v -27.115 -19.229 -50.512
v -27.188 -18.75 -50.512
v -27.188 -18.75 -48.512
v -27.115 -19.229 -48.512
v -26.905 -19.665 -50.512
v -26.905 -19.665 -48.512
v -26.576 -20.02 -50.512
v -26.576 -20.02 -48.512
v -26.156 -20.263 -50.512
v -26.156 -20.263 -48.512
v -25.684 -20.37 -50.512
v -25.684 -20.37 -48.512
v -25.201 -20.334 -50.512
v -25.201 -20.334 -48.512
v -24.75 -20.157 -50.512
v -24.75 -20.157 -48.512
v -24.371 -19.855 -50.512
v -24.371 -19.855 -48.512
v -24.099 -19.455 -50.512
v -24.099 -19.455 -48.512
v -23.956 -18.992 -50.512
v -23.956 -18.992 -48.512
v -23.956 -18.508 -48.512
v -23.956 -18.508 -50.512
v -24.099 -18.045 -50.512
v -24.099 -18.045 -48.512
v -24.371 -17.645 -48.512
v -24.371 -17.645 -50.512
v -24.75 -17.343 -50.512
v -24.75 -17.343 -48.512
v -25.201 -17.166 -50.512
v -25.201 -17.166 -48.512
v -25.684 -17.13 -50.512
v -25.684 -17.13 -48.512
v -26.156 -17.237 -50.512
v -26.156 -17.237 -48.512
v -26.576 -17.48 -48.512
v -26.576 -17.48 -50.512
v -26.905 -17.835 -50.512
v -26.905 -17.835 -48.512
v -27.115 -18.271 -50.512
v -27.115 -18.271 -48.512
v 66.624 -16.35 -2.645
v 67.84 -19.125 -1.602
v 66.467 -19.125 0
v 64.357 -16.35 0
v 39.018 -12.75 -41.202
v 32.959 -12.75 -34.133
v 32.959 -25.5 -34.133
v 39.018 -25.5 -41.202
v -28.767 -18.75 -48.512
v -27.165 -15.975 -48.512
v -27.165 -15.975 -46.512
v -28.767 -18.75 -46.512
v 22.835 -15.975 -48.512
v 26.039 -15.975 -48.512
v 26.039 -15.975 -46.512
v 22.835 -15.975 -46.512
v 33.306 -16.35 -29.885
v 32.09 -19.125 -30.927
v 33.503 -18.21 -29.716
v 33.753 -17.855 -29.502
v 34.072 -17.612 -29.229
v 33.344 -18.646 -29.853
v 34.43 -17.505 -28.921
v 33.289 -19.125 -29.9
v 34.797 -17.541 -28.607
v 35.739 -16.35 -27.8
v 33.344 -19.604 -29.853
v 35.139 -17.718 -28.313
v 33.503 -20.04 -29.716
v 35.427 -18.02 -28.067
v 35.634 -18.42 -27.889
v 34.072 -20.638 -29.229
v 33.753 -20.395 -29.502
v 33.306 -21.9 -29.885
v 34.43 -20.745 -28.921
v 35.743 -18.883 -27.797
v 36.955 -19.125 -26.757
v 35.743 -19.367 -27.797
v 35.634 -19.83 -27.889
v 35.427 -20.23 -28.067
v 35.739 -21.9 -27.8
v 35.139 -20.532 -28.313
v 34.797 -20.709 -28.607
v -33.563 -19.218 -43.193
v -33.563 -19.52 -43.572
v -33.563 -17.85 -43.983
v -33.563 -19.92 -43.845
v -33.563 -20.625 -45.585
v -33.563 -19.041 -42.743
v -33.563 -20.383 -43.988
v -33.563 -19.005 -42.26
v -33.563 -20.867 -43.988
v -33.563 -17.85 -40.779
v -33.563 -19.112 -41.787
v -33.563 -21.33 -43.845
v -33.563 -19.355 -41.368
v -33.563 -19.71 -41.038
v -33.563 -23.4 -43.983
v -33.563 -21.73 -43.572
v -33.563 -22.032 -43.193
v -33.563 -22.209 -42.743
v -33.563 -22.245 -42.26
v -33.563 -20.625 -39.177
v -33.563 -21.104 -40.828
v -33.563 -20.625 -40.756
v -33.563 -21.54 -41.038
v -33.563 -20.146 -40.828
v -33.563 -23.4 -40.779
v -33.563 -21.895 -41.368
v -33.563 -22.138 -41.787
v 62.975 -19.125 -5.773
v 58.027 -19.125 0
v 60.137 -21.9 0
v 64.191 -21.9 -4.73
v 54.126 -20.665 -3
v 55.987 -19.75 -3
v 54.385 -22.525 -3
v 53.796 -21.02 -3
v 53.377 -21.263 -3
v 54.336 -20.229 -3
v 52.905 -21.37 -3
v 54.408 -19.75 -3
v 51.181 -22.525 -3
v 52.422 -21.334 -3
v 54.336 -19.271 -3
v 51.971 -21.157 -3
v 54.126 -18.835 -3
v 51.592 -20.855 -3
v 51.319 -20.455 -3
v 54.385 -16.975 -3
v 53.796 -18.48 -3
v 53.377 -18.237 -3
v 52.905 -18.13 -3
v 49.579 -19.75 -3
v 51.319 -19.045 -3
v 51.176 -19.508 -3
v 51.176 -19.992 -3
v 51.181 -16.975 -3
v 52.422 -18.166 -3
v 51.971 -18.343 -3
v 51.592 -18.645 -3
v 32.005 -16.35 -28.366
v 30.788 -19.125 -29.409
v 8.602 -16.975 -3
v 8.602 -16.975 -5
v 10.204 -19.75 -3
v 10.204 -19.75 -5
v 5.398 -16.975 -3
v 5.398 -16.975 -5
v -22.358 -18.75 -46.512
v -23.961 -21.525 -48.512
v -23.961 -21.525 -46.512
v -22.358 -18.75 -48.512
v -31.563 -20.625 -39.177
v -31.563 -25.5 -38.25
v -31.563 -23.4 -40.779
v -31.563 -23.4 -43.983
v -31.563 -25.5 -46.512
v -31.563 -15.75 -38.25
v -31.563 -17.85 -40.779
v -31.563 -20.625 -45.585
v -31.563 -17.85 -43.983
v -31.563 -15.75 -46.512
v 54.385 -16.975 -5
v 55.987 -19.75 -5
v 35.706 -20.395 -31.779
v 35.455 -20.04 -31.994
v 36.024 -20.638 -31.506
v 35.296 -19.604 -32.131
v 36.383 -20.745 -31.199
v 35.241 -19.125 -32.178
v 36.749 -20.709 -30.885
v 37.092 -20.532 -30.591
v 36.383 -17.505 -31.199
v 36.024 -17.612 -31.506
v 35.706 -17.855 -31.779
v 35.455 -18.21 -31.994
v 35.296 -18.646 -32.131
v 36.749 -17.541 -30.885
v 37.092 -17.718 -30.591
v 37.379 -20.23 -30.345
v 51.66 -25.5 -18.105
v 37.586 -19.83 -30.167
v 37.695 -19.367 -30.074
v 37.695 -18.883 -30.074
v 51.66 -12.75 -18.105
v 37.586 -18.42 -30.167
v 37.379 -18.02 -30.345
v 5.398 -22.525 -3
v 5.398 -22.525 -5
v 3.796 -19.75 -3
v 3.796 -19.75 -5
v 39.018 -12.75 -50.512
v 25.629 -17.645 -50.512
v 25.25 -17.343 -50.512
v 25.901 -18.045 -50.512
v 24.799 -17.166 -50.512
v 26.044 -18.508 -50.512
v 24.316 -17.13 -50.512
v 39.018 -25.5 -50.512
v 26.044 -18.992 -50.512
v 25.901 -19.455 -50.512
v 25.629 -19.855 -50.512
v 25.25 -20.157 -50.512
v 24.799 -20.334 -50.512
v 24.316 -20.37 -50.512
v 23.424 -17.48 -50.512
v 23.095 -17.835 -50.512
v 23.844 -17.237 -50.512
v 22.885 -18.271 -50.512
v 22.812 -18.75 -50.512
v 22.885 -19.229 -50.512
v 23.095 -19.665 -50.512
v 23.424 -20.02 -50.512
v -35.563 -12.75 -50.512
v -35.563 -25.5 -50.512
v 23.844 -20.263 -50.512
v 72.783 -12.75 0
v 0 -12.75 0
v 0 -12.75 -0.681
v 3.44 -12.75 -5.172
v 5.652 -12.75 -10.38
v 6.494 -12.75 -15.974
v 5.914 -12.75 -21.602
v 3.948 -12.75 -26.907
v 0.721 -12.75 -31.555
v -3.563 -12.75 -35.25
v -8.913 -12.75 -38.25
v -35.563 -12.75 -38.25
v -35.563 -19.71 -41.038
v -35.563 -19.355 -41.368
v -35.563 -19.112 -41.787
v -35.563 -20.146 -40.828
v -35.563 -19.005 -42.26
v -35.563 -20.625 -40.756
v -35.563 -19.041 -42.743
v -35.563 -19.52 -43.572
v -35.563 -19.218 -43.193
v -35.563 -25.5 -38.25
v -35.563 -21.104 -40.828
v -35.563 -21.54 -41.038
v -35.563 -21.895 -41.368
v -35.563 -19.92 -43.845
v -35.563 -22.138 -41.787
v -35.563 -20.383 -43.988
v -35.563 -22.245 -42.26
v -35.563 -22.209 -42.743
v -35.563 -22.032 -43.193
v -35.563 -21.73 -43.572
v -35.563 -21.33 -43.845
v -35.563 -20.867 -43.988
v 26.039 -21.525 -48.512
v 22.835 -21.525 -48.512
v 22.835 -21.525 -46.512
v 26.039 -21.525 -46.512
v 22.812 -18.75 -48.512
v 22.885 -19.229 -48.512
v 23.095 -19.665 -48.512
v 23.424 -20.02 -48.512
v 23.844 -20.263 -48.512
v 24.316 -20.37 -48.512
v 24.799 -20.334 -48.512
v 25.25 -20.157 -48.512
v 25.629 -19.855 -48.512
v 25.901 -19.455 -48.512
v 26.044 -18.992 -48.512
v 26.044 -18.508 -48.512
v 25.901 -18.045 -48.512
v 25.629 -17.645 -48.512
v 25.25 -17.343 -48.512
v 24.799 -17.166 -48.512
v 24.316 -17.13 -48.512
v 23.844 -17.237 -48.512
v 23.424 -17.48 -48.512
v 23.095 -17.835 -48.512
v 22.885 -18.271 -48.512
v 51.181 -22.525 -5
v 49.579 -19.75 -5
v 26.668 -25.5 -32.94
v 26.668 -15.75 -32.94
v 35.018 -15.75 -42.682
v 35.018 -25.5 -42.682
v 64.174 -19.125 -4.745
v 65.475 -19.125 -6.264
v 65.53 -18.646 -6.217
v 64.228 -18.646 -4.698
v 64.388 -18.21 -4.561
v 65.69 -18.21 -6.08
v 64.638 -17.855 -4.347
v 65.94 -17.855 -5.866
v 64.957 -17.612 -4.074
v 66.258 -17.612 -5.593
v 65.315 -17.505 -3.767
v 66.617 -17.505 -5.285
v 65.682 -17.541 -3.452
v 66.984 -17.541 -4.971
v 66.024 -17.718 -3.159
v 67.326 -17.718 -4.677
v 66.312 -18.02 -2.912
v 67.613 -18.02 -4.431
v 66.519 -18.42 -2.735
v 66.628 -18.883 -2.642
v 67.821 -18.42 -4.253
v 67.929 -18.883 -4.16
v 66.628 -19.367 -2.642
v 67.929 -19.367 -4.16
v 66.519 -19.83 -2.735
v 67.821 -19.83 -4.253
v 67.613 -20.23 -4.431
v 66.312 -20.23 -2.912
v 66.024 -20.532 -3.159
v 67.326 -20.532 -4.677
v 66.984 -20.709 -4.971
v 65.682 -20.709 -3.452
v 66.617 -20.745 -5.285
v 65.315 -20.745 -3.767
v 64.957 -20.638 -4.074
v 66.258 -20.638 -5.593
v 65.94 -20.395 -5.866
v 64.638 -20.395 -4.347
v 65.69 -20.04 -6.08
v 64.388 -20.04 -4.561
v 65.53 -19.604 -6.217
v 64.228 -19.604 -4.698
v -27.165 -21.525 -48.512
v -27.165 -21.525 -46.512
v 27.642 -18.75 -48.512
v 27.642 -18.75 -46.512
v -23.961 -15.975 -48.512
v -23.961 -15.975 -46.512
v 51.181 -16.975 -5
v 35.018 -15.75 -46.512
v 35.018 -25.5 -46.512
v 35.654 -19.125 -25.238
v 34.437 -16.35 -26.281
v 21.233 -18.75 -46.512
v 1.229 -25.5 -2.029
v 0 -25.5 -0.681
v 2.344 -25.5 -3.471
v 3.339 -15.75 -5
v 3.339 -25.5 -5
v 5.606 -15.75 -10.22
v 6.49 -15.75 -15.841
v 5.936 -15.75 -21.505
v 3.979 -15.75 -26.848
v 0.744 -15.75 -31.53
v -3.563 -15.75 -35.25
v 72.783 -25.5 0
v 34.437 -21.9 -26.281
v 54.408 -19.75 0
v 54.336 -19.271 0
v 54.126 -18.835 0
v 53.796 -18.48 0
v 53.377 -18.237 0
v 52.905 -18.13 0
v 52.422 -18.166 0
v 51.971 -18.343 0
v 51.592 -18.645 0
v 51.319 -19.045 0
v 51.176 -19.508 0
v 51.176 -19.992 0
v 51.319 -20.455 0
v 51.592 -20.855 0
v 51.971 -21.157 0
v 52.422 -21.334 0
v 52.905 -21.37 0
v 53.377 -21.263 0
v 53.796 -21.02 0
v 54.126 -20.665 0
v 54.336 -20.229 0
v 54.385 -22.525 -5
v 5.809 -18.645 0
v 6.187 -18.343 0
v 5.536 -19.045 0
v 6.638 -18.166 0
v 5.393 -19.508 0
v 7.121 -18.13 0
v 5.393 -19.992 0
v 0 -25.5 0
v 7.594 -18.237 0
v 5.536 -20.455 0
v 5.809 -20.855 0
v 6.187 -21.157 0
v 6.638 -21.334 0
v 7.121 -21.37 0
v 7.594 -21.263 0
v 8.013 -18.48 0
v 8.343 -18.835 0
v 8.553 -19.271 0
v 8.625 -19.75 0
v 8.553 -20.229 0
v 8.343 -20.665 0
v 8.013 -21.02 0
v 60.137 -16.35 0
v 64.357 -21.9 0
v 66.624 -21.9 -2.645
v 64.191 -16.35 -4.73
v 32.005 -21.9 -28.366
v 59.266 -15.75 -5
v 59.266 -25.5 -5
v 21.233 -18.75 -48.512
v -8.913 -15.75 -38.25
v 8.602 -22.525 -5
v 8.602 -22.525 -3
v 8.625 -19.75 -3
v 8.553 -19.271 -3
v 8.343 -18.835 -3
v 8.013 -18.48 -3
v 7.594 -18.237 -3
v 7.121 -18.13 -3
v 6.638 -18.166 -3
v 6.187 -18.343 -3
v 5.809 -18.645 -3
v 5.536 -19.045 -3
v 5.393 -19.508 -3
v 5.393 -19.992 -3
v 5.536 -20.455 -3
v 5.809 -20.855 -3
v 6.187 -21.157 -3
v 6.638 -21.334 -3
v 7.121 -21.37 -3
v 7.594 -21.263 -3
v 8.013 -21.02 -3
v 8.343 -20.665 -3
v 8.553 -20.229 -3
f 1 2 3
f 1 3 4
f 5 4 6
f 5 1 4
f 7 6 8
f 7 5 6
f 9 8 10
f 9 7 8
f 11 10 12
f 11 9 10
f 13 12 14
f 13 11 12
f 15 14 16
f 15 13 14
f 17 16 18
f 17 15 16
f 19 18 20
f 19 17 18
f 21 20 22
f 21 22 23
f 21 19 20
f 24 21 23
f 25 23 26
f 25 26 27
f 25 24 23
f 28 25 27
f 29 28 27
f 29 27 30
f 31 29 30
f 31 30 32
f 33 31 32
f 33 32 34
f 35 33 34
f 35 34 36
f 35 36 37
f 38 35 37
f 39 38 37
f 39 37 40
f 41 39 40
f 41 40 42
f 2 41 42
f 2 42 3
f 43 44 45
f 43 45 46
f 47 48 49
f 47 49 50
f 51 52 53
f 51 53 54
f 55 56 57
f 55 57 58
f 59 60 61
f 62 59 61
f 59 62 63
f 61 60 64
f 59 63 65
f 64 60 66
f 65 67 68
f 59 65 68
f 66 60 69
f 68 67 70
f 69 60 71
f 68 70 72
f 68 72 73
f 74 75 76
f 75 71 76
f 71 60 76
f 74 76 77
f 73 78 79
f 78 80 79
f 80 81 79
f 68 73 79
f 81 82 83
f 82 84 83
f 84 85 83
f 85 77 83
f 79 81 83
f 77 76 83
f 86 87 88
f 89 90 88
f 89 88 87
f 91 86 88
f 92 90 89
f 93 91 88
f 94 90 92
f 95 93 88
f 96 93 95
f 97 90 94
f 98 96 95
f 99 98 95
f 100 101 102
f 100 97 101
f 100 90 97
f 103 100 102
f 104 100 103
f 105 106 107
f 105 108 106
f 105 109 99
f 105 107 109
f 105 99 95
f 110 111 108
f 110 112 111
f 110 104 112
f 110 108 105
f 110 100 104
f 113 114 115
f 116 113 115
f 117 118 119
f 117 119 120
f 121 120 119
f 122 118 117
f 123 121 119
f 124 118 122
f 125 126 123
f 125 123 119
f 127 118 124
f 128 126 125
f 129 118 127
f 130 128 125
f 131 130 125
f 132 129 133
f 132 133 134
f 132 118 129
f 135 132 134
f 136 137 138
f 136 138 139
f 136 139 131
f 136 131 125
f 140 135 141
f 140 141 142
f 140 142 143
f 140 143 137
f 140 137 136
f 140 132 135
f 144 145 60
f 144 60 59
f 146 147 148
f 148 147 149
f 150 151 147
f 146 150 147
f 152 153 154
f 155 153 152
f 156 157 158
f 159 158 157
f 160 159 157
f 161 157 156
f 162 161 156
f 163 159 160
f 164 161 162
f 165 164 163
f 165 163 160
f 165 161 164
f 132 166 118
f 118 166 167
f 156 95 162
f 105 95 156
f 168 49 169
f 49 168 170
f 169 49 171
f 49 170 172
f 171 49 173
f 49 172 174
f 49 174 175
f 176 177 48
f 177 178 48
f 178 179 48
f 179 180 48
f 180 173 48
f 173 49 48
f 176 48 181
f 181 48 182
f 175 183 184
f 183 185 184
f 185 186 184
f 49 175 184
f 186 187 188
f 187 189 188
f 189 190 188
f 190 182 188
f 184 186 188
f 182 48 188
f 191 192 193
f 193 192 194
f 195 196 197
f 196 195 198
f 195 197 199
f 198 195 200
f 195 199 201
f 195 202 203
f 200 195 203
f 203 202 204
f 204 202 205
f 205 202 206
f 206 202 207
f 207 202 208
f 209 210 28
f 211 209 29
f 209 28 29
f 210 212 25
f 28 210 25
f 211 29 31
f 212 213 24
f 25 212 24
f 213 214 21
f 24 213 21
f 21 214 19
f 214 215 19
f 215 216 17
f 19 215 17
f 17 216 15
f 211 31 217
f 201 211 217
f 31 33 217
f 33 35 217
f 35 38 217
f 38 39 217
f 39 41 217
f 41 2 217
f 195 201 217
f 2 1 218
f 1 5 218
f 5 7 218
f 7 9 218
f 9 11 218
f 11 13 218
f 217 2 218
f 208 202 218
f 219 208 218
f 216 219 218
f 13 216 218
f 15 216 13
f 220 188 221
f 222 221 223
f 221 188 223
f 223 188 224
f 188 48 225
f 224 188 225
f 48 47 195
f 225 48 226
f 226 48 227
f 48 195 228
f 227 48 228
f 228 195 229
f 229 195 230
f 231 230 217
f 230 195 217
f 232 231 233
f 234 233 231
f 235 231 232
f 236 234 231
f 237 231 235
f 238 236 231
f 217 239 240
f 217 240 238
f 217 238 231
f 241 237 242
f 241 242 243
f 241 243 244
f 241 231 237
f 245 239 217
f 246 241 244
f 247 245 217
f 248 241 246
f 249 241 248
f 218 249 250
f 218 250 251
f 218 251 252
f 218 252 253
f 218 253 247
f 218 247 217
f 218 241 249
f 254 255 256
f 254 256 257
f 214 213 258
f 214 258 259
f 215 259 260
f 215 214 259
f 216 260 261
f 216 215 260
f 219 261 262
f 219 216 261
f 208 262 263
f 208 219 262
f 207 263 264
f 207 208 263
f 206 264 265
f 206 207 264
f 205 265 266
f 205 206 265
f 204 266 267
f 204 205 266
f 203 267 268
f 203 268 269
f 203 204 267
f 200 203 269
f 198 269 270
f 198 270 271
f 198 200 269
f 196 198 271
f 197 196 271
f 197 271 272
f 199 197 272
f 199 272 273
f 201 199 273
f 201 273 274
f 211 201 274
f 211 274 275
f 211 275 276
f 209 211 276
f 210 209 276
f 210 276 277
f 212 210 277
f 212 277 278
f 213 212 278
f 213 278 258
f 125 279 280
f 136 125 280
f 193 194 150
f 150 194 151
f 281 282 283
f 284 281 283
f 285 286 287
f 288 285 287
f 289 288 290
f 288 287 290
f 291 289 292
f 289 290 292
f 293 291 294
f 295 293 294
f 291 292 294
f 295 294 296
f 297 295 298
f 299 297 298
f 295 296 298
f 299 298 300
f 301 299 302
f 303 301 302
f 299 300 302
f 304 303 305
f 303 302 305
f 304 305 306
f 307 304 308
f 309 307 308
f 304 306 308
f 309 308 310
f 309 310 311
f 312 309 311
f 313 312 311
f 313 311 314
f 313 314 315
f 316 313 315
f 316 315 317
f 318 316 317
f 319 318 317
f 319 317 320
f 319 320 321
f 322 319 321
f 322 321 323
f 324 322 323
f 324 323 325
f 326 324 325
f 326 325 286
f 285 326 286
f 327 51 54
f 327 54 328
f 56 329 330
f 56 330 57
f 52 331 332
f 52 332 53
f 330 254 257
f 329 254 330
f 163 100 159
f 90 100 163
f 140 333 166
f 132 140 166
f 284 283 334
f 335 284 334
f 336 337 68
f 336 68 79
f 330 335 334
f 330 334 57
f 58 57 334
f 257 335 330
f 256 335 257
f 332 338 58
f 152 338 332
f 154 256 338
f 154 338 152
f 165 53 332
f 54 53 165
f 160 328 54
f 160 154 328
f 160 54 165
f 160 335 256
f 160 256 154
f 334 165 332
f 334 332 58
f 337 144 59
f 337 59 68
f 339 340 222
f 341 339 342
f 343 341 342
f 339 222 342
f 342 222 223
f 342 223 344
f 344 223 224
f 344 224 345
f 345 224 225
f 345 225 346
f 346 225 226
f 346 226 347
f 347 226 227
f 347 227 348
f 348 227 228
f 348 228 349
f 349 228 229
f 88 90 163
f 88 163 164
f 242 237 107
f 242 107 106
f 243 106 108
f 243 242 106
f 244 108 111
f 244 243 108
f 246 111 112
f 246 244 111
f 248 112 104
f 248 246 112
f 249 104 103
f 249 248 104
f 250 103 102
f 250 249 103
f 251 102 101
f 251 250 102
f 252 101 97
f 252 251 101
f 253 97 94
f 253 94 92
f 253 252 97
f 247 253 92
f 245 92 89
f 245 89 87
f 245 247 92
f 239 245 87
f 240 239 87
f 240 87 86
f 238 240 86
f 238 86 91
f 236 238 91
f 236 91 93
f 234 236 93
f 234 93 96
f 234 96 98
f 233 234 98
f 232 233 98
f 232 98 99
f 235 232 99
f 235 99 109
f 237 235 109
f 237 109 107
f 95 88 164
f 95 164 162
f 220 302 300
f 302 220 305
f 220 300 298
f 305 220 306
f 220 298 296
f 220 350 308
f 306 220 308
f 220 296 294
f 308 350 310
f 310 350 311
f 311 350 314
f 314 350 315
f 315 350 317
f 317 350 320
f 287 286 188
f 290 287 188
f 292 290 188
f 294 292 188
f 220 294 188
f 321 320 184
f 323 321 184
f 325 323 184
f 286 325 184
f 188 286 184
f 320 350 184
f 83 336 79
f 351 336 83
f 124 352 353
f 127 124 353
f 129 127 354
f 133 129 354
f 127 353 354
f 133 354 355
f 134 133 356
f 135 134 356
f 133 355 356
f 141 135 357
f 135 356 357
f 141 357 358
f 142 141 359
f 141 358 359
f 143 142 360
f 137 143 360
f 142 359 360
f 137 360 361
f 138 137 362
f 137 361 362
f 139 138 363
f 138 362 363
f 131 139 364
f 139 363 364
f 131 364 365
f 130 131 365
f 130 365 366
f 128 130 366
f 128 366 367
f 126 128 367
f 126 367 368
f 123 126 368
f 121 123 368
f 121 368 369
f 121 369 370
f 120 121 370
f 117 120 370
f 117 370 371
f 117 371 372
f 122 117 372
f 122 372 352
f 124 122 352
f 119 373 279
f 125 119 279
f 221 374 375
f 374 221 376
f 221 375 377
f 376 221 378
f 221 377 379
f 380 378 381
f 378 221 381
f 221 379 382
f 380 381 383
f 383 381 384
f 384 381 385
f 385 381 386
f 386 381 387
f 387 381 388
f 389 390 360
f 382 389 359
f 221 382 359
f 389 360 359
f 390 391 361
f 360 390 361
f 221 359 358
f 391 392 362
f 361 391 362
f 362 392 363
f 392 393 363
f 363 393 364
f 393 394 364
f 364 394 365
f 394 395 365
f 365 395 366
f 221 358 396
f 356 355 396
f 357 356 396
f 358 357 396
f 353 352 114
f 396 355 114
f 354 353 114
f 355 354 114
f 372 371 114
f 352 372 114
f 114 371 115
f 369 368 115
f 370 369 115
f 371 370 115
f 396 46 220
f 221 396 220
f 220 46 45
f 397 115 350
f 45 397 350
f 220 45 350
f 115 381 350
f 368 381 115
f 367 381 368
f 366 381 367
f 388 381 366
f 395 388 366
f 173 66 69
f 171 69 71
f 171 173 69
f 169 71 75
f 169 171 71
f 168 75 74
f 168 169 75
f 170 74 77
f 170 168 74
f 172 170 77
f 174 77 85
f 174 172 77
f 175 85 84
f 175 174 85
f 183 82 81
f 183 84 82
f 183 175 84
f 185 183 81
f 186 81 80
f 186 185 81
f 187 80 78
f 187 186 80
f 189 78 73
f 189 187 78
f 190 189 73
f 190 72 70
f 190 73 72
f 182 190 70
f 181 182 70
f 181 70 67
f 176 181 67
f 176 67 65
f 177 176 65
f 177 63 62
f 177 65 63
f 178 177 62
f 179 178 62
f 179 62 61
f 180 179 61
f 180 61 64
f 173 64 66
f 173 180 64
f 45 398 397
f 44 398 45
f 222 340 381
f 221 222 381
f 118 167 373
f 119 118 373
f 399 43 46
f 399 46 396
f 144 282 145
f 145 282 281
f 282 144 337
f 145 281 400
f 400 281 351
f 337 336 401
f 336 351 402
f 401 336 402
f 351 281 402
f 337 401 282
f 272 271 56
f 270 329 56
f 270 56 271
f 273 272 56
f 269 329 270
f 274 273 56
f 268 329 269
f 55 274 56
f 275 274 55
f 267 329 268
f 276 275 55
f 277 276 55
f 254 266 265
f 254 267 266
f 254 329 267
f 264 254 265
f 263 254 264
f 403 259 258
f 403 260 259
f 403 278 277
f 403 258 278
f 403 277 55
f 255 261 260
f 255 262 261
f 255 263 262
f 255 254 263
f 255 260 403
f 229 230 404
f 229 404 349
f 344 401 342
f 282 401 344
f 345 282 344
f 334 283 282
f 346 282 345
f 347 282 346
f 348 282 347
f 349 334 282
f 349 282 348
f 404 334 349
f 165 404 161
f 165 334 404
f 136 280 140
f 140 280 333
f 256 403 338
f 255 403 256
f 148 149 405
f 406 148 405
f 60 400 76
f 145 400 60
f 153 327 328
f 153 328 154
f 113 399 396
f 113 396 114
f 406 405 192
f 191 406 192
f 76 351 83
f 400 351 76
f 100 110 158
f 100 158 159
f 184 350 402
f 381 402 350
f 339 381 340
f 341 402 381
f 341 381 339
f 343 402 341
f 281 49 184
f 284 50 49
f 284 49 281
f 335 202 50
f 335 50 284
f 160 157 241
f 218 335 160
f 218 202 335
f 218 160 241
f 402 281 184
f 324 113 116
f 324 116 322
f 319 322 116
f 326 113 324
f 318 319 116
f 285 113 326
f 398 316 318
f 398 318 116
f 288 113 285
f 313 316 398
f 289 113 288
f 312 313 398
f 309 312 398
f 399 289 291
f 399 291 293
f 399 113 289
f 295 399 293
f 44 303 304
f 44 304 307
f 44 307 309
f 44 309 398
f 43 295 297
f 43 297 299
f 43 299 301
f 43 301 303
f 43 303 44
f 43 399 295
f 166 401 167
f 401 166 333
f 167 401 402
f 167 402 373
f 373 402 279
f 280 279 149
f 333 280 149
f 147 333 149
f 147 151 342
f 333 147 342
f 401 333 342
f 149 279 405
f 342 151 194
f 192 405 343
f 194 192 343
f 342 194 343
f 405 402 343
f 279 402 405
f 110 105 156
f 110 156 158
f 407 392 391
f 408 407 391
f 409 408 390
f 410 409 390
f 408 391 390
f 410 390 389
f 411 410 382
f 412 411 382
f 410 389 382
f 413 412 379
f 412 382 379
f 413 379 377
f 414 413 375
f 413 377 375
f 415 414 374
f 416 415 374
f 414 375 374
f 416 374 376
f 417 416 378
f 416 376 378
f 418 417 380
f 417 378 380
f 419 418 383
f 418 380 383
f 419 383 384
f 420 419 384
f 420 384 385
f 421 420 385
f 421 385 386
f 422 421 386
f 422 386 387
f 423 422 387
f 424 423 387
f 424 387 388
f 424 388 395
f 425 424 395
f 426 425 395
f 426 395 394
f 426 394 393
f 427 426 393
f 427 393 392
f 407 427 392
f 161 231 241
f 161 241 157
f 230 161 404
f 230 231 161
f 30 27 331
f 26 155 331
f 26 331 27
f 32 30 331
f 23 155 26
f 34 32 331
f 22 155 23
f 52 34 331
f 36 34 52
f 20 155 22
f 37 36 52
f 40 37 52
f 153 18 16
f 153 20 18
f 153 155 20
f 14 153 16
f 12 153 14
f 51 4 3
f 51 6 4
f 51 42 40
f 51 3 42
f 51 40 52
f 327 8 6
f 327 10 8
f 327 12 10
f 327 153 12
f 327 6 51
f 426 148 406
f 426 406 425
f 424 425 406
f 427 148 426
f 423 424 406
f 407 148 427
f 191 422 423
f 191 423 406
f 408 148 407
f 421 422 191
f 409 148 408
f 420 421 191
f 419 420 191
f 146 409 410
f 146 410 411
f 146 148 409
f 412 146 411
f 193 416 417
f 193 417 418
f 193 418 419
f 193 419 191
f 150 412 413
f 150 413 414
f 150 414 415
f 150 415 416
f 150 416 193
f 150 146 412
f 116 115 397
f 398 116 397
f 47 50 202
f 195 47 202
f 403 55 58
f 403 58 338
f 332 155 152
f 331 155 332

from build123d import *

# Parameters (mm, degrees)
SALIENTE_EXTRUIR1_DEPTH     = 12.75
CORTAR_EXTRUIR1_REACH       = 31.62
CROQUIS2_R                  = 1.625
CROQUIS3_R                  = 22.5
CORTAR_EXTRUIR2_DEPTH       = 13.75
SALIENTE_EXTRUIR2_DEPTH     = 3
SALIENTE_EXTRUIR3_DEPTH     = 9.75
CROQUIS6_R                  = 1.625
CORTAR_EXTRUIR3_DEPTH       = 10
CORTAR_EXTRUIR4_START       = -2
CORTAR_EXTRUIR4_DEPTH       = 10
CORTAR_EXTRUIR5_START       = -2
CORTAR_EXTRUIR5_DEPTH       = 10
CORTAR_EXTRUIR6_DEPTH       = 2
CORTAR_EXTRUIR7_REACH       = 37.25
CROQUIS10_R                 = 1.625
CORTAR_EXTRUIR8_DEPTH       = 2
CROQUIS12_W                 = 92.508691999
CROQUIS12_H                 = 24.255818813
CORTAR_EXTRUIR9_DEPTH       = 1
CORTAR_EXTRUIR9_DEPTH_BACK  = 36.25
SALIENTE_EXTRUIR4_DEPTH     = 12.75
CORTAR_EXTRUIR10_START      = -9.75
CORTAR_EXTRUIR10_DEPTH      = 9.75
CROQUIS16_W                 = 68.039065087
CROQUIS16_H                 = 12.75
CORTAR_EXTRUIR11_DEPTH      = 1
CROQUIS17_W                 = 40.657498706
CROQUIS17_H                 = 22.934549925
CORTAR_EXTRUIR12_DEPTH      = 1
CORTAR_EXTRUIR12_DEPTH_BACK = 13.75
SALIENTE_EXTRUIR5_REACH     = 14.75
CROQUIS18_W                 = 34.9120451
CROQUIS18_H                 = 3.951156815
CROQUIS20_R                 = 1.625
CORTAR_EXTRUIR14_DEPTH      = 10
CORTAR_EXTRUIR15_DEPTH      = 2
CROQUIS22_R                 = 1.625
CORTAR_EXTRUIR16_DEPTH      = 10
CORTAR_EXTRUIR17_DEPTH      = 2
SALIENTE_EXTRUIR6_DEPTH     = 12.75
CORTAR_EXTRUIR18_DEPTH      = 2
CROQUIS28_R                 = 1.625
SALIENTE_EXTRUIR7_DEPTH     = 1
CORTAR_EXTRUIR19_REACH      = 110.346
CROQUIS29_R                 = 1.625
CORTAR_EXTRUIR20_DEPTH      = 2
SALIENTE_EXTRUIR11_DEPTH    = 12.75
CROQUIS41_R                 = 1.625
CORTAR_EXTRUIR25_DEPTH      = 10
SALIENTE_EXTRUIR12_DEPTH    = 12.75
SALIENTE_EXTRUIR13_DEPTH    = 12.75
CORTAR_EXTRUIR26_DEPTH      = 13.75
SALIENTE_EXTRUIR14_START    = -9.15
SALIENTE_EXTRUIR14_DEPTH    = 5.55
SALIENTE_EXTRUIR15_REACH    = 14.75
CORTAR_EXTRUIR27_REACH      = 110.346
CROQUIS47_R                 = 1.625
CORTAR_EXTRUIR28_REACH      = 112.346
CORTAR_EXTRUIR28_START      = -2
CORTAR_EXTRUIR29_START      = -9.75
CORTAR_EXTRUIR29_DEPTH      = 9.75
CORTAR_EXTRUIR30_REACH      = 52.512
CROQUIS50_R                 = 1.625
CORTAR_EXTRUIR31_REACH      = 54.512
CORTAR_EXTRUIR31_START      = -2
CROQUIS19_W                 = 120.448667976
CROQUIS19_H                 = 32.886651308
CORTAR_EXTRUIR13_DEPTH      = 1
CORTAR_EXTRUIR13_DEPTH_BACK = 62.623336743


with BuildPart() as part:
    # Croquis1 → Saliente-Extruir1 (new body)
    with BuildSketch(Plane(origin=(0, 0, 0), x_dir=(1, 0, 0), z_dir=(0, 1, 0))):
        Polygon((0, 0), (72.78319995, 0), (38.224450787, 29.62043043), (35.621353918, 26.5833452), (60.803074847, 5), (0, 5), align=None)
    extrude(amount=SALIENTE_EXTRUIR1_DEPTH)

    # Croquis2 → Cortar-Extruir1 (cut, up to next)
    with BuildSketch(Plane.XY, mode=Mode.PRIVATE) as cortar_extruir1_sk1:
        with Locations((52.78319995, 5.75)):
            Circle(CROQUIS2_R)
    cortar_extruir1_tool1 = extrude(cortar_extruir1_sk1.sketch, amount=-CORTAR_EXTRUIR1_REACH, mode=Mode.PRIVATE) & part.part
    add(cortar_extruir1_tool1.solids().sort_by_distance((52.7832, 5.75, 0))[0], mode=Mode.SUBTRACT)
    # Croquis2 → Cortar-Extruir1 (cut, up to next)
    with BuildSketch(Plane.XY, mode=Mode.PRIVATE) as cortar_extruir1_sk2:
        with Locations((6.99999995, 5.75)):
            Circle(CROQUIS2_R)
    cortar_extruir1_tool2 = extrude(cortar_extruir1_sk2.sketch, amount=-CORTAR_EXTRUIR1_REACH, mode=Mode.PRIVATE) & part.part
    add(cortar_extruir1_tool2.solids().sort_by_distance((7, 5.75, 0))[0], mode=Mode.SUBTRACT)

    # Croquis3 → Cortar-Extruir2 (cut, through all)
    with BuildSketch(Plane(origin=(0, 12.75, 0), x_dir=(1, 0, 0), z_dir=(0, 1, 0))):
        with Locations((-16, 16.5)):
            Circle(CROQUIS3_R)
    extrude(amount=-CORTAR_EXTRUIR2_DEPTH, mode=Mode.SUBTRACT)

    # Croquis4 → Saliente-Extruir2 (add)
    with BuildSketch(Plane(origin=(0, 12.75, 0), x_dir=(1, 0, 0), z_dir=(0, 1, 0))):
        with BuildLine():
            Line((38.224450787, 29.62043043), (31.656319269, 35.25))
            Line((31.656319269, 35.25), (-3.562657036, 35.25))
            ThreePointArc((-3.562657036, 35.25), (5.936291456, 21.504909307), (3.339079606, 5))
            Line((3.339079606, 5), (60.803074847, 5))
            Line((60.803074847, 5), (35.621353918, 26.5833452))
            Line((35.621353918, 26.5833452), (38.224450787, 29.62043043))
        make_face()
    extrude(amount=-SALIENTE_EXTRUIR2_DEPTH)

    # Croquis5 → Saliente-Extruir3 (add)
    with BuildSketch(Plane.XZ.offset(-9.75)):
        with BuildLine():
            Line((-3.562657036, -35.25), (31.656319269, -35.25))
            Line((31.656319269, -35.25), (38.224450787, -29.62043043))
            Line((38.224450787, -29.62043043), (35.621353918, -26.5833452))
            Line((35.621353918, -26.5833452), (30.17667434, -31.25))
            Line((30.17667434, -31.25), (0.990806338, -31.25))
            ThreePointArc((0.990806338, -31.25), (-1.15062315, -33.404023402), (-3.562657036, -35.25))
        make_face()
    extrude(amount=SALIENTE_EXTRUIR3_DEPTH)

    # Croquis6 → Cortar-Extruir3 (cut)
    with BuildSketch(Plane(origin=(30.824200619, 0, -35.963211942), x_dir=(-0.759271307, 0, -0.650774217), z_dir=(0.650774217, 0, -0.759271307))):
        with Locations((-47.262195378, 6.375)):
            Circle(CROQUIS6_R)
        with Locations((-7.442195378, 6.375)):
            Circle(CROQUIS6_R)
    extrude(amount=-CORTAR_EXTRUIR3_DEPTH, mode=Mode.SUBTRACT)

    # Croquis7 → Cortar-Extruir4 (cut)
    with BuildSketch(Plane(origin=(28.22110375, 0, -32.926126712), x_dir=(0.759271307, 0, 0.650774217), z_dir=(-0.650774217, 0, 0.759271307)).offset(CORTAR_EXTRUIR4_START)):
        Polygon((48.864342375, 3.6), (50.466489372, 6.375), (48.864342375, 9.15), (45.660048381, 9.15), (44.057901384, 6.375), (45.660048381, 3.6), align=None)
    extrude(amount=CORTAR_EXTRUIR4_DEPTH, mode=Mode.SUBTRACT)

    # Croquis8 → Cortar-Extruir5 (cut)
    with BuildSketch(Plane(origin=(28.22110375, 0, -32.926126712), x_dir=(0.759271307, 0, 0.650774217), z_dir=(-0.650774217, 0, 0.759271307)).offset(CORTAR_EXTRUIR5_START)):
        Polygon((9.044342375, 3.6), (10.646489372, 6.375), (9.044342375, 9.15), (5.840048381, 9.15), (4.237901384, 6.375), (5.840048381, 3.6), align=None)
    extrude(amount=CORTAR_EXTRUIR5_DEPTH, mode=Mode.SUBTRACT)

    # Croquis9 → Cortar-Extruir6 (cut)
    with BuildSketch(Plane(origin=(0, 0, -5), x_dir=(-1, 0, 0), z_dir=(0, 0, -1))):
        Polygon((-5.397852953, 2.975), (-3.795705956, 5.75), (-5.397852953, 8.525), (-8.602146947, 8.525), (-10.204293944, 5.75), (-8.602146947, 2.975), align=None)
        Polygon((-51.181052953, 2.975), (-49.578905956, 5.75), (-51.181052953, 8.525), (-54.385346947, 8.525), (-55.987493944, 5.75), (-54.385346947, 2.975), align=None)
    extrude(amount=-CORTAR_EXTRUIR6_DEPTH, mode=Mode.SUBTRACT)

    # Croquis10 → Cortar-Extruir7 (cut, up to next)
    with BuildSketch(Plane(origin=(0, 0, -35.25), x_dir=(-1, 0, 0), z_dir=(0, 0, -1)), mode=Mode.PRIVATE) as cortar_extruir7_sk1:
        with Locations((-21.656319269, 6.375)):
            Circle(CROQUIS10_R)
    cortar_extruir7_tool1 = extrude(cortar_extruir7_sk1.sketch, amount=-CORTAR_EXTRUIR7_REACH, mode=Mode.PRIVATE) & part.part
    add(cortar_extruir7_tool1.solids().sort_by_distance((21.656319, 6.375, -35.25))[0], mode=Mode.SUBTRACT)

    # Croquis11 → Cortar-Extruir8 (cut)
    with BuildSketch(Plane.XY.offset(-31.25)):
        Polygon((23.258466266, 3.6), (24.860613263, 6.375), (23.258466266, 9.15), (20.054172272, 9.15), (18.452025275, 6.375), (20.054172272, 3.6), align=None)
    extrude(amount=-CORTAR_EXTRUIR8_DEPTH, mode=Mode.SUBTRACT)

    # Simetría1: part across plane


with BuildPart() as part_1:
    add(part.part)
    add(part.part.mirror(Plane.ZX))

    # Croquis12 → Cortar-Extruir9 (cut, two sides)
    with BuildSketch(Plane(origin=(0, 0, -35.25), x_dir=(-1, 0, 0), z_dir=(0, 0, -1))) as cortar_extruir9_sk:
        with Locations((-33.077560565, 12.127909407)):
            Rectangle(CROQUIS12_W, CROQUIS12_H)
    extrude(amount=CORTAR_EXTRUIR9_DEPTH, mode=Mode.SUBTRACT)
    extrude(cortar_extruir9_sk.sketch, amount=-CORTAR_EXTRUIR9_DEPTH_BACK, mode=Mode.SUBTRACT)

    # Croquis13 → Saliente-Extruir4 (add)
    with BuildSketch(Plane.XZ.offset(12.75)):
        Polygon((-35.562657036, -82.38260805), (-35.562657036, -38.25), (-8.913300435, -38.25), (-3.562657036, -35.25), (31.656319269, -35.25), (0.000162281, -62.38260805), align=None)
    extrude(amount=-SALIENTE_EXTRUIR4_DEPTH)

    # Croquis14 → Cortar-Extruir10 (cut)
    with BuildSketch(Plane(origin=(0, 0, 0), x_dir=(1, 0, 0), z_dir=(0, 1, 0)).offset(CORTAR_EXTRUIR10_START)):
        Polygon((30.17667434, 31.25), (0.990806338, 31.25), (-31.562657036, 38.25), (-31.562657036, 75.543902968), (-2.303881466, 59.089203295), align=None)
    extrude(amount=CORTAR_EXTRUIR10_DEPTH, mode=Mode.SUBTRACT)

    # Croquis16 → Cortar-Extruir11 (cut)
    with BuildSketch(Plane(origin=(30.824200619, 0, -35.963211942), x_dir=(-0.759271307, 0, -0.650774217), z_dir=(0.650774217, 0, -0.759271307))):
        with Locations((6.577337166, -6.375)):
            Rectangle(CROQUIS16_W, CROQUIS16_H)
    extrude(amount=-CORTAR_EXTRUIR11_DEPTH, mode=Mode.SUBTRACT)

    # Croquis17 → Cortar-Extruir12 (cut, two sides)
    with BuildSketch(Plane.XZ.offset(12.75)) as cortar_extruir12_sk:
        with Locations((-20.328587072, -73.090611706)):
            Rectangle(CROQUIS17_W, CROQUIS17_H)
    extrude(amount=CORTAR_EXTRUIR12_DEPTH, mode=Mode.SUBTRACT)
    extrude(cortar_extruir12_sk.sketch, amount=-CORTAR_EXTRUIR12_DEPTH_BACK, mode=Mode.SUBTRACT)

    # Croquis18 → Saliente-Extruir5 (add, up to next)
    with BuildSketch(Plane(origin=(0, 0, 0), x_dir=(1, 0, 0), z_dir=(0, 1, 0)), mode=Mode.PRIVATE) as saliente_extruir5_sk1:
        with Locations((-18.106634486, 59.647758336)):
            Rectangle(CROQUIS18_W, CROQUIS18_H)
    saliente_extruir5_tool1 = extrude(saliente_extruir5_sk1.sketch, amount=-SALIENTE_EXTRUIR5_REACH, mode=Mode.PRIVATE) - part_1.part
    add(saliente_extruir5_tool1.solids().sort_by_distance((-18.106634, 0, -59.647758))[0])

    # Croquis20 → Cortar-Extruir14 (cut)
    with BuildSketch(Plane(origin=(30.173426402, 0, -35.203940634), x_dir=(-0.759271307, 0, -0.650774217), z_dir=(0.650774217, 0, -0.759271307))):
        with Locations((25.596869709, -6.375)):
            Circle(CROQUIS20_R)
        with Locations((-7.442195378, -6.375)):
            Circle(CROQUIS20_R)
    extrude(amount=-CORTAR_EXTRUIR14_DEPTH, mode=Mode.SUBTRACT)

    # Croquis21 → Cortar-Extruir15 (cut)
    with BuildSketch(Plane(origin=(28.22110375, 0, -32.926126712), x_dir=(0.759271307, 0, 0.650774217), z_dir=(-0.650774217, 0, 0.759271307))):
        Polygon((-23.994722712, -9.15), (-22.392575715, -6.375), (-23.994722712, -3.6), (-27.199016706, -3.6), (-28.801163703, -6.375), (-27.199016706, -9.15), align=None)
    extrude(amount=-CORTAR_EXTRUIR15_DEPTH, mode=Mode.SUBTRACT)

    # Croquis22 → Cortar-Extruir16 (cut)
    with BuildSketch(Plane(origin=(0, 0, -61.623336743), x_dir=(-1, 0, 0), z_dir=(0, 0, -1))):
        with Locations((18.112657036, -6.375)):
            Circle(CROQUIS22_R)
    extrude(amount=-CORTAR_EXTRUIR16_DEPTH, mode=Mode.SUBTRACT)

    # Croquis23 → Cortar-Extruir17 (cut)
    with BuildSketch(Plane.XY.offset(-57.672179928)):
        Polygon((-16.510510039, -9.15), (-14.908363042, -6.375), (-16.510510039, -3.6), (-19.714804033, -3.6), (-21.31695103, -6.375), (-19.714804033, -9.15), align=None)
    extrude(amount=-CORTAR_EXTRUIR17_DEPTH, mode=Mode.SUBTRACT)

    # Croquis26 → Saliente-Extruir6 (add)
    with BuildSketch(Plane(origin=(0, 0, 0), x_dir=(1, 0, 0), z_dir=(0, 1, 0))):
        Polygon((60.803074847, 5), (-2.287792345, 59.07541325), (-2.938566562, 58.316141943), (60.15230063, 4.240728693), align=None)
    extrude(amount=-SALIENTE_EXTRUIR6_DEPTH)

    # Croquis27 → Cortar-Extruir18 (cut)
    with BuildSketch(Plane(origin=(27.570329533, 0, -32.166855405), x_dir=(0.759271307, 0, 0.650774217), z_dir=(-0.650774217, 0, 0.759271307))):
        Polygon((-22.421443229, -6.375), (-24.009156469, -3.625), (-27.184582949, -3.625), (-28.77229619, -6.375), (-27.184582949, -9.125), (-24.009156469, -9.125), align=None)
        Polygon((10.646489372, -6.375), (9.044342375, -3.6), (5.840048381, -3.6), (4.237901384, -6.375), (5.840048381, -9.15), (9.044342375, -9.15), align=None)
    extrude(amount=-CORTAR_EXTRUIR18_DEPTH, mode=Mode.SUBTRACT)

    # Croquis28 → Saliente-Extruir7 (add)
    with BuildSketch(Plane(origin=(29.522652185, 0, -34.444669327), x_dir=(0.759271307, 0, 0.650774217), z_dir=(-0.650774217, 0, 0.759271307))):
        Polygon((-24.009156469, -3.625), (-27.184582949, -3.625), (-28.77229619, -6.375), (-27.184582949, -9.125), (-24.009156469, -9.125), (-22.421443229, -6.375), align=None)
        with Locations((-25.596869709, -6.375)):
            Circle(CROQUIS28_R, mode=Mode.SUBTRACT)
        Polygon((10.646489372, -6.375), (9.044342375, -3.6), (5.840048381, -3.6), (4.237901384, -6.375), (5.840048381, -9.15), (9.044342375, -9.15), align=None)
        with Locations((7.442195378, -6.375)):
            Circle(CROQUIS28_R, mode=Mode.SUBTRACT)
    extrude(amount=SALIENTE_EXTRUIR7_DEPTH)

    # Croquis29 → Cortar-Extruir19 (cut, up to next)
    with BuildSketch(Plane.ZY.offset(35.562657036), mode=Mode.PRIVATE) as cortar_extruir19_sk1:
        with Locations((-51.623336743, -6.375)):
            Circle(CROQUIS29_R)
    cortar_extruir19_tool1 = extrude(cortar_extruir19_sk1.sketch, amount=-CORTAR_EXTRUIR19_REACH, mode=Mode.PRIVATE) & part_1.part
    add(cortar_extruir19_tool1.solids().sort_by_distance((-35.562657, -6.375, -51.623337))[0], mode=Mode.SUBTRACT)

    # Croquis30 → Cortar-Extruir20 (cut)
    with BuildSketch(Plane(origin=(-31.562657036, 0, 0), x_dir=(0, 0, -1), z_dir=(1, 0, 0))):
        Polygon((53.22548374, -9.15), (54.827630737, -6.375), (53.22548374, -3.6), (50.021189746, -3.6), (48.419042749, -6.375), (50.021189746, -9.15), align=None)
    extrude(amount=-CORTAR_EXTRUIR20_DEPTH, mode=Mode.SUBTRACT)

    # Croquis40 → Saliente-Extruir11 (add)
    with BuildSketch(Plane.XZ.offset(12.75)):
        Polygon((51.009497963, -17.345267417), (-0.650611936, -61.623336743), (0.886019316, -61.623336743), (51.66027218, -18.104538724), align=None)
    extrude(amount=-SALIENTE_EXTRUIR11_DEPTH)

    # Croquis41 → Cortar-Extruir25 (cut)
    with BuildSketch(Plane(origin=(30.824200619, 0, -35.963211942), x_dir=(-0.759271307, 0, -0.650774217), z_dir=(0.650774217, 0, -0.759271307))):
        with Locations((-7.442195378, -6.375)):
            Circle(CROQUIS41_R)
        with Locations((25.596869709, -6.375)):
            Circle(CROQUIS41_R)
    extrude(amount=-CORTAR_EXTRUIR25_DEPTH, mode=Mode.SUBTRACT)

    # Croquis42 → Saliente-Extruir12 (add)
    with BuildSketch(Plane.XZ.offset(12.75)):
        Polygon((32.95941988, -34.133107696), (39.018127843, -41.201923567), (24.71209089, -41.201923567), align=None)
    extrude(amount=-SALIENTE_EXTRUIR12_DEPTH)

    # Croquis43 → Saliente-Extruir13 (add)
    with BuildSketch(Plane.XZ.offset(12.75)):
        Polygon((39.018127843, -41.201923567), (39.018127843, -50.511923567), (13.849927511, -50.511923567), (24.71209089, -41.201923567), align=None)
    extrude(amount=-SALIENTE_EXTRUIR13_DEPTH)

    # Croquis44 → Cortar-Extruir26 (cut, through all)
    with BuildSketch(Plane.XZ.offset(12.75)):
        Polygon((13.849927511, -50.511923567), (-35.562657036, -50.511923567), (-35.562657036, -61.623336743), (0.886019316, -61.623336743), align=None)
    extrude(amount=-CORTAR_EXTRUIR26_DEPTH, mode=Mode.SUBTRACT)

    # Croquis45 → Saliente-Extruir14 (add)
    with BuildSketch(Plane(origin=(0, 0, 0), x_dir=(1, 0, 0), z_dir=(0, 1, 0)).offset(SALIENTE_EXTRUIR14_START)):
        Polygon((6.166771253, 50.511923567), (21.724093533, 50.511923567), (21.724093533, 37.177685684), align=None)
    extrude(amount=SALIENTE_EXTRUIR14_DEPTH)

    # Croquis46 → Saliente-Extruir15 (add, up to next)
    with BuildSketch(Plane(origin=(0, 0, 0), x_dir=(1, 0, 0), z_dir=(0, 1, 0)), mode=Mode.PRIVATE) as saliente_extruir15_sk1:
        Polygon((-35.562657036, 50.511923567), (-31.562657036, 50.511923567), (10.83365133, 50.511923567), (10.83365133, 46.511923567), (-31.562657036, 46.511923567), (-31.562657036, 38.25), (-35.562657036, 38.25), align=None)
    saliente_extruir15_tool1 = extrude(saliente_extruir15_sk1.sketch, amount=-SALIENTE_EXTRUIR15_REACH, mode=Mode.PRIVATE) - part_1.part
    add(saliente_extruir15_tool1.solids().sort_by_distance((-15.568733, 0, -47.585191))[0])

    # Croquis47 → Cortar-Extruir27 (cut, up to next)
    with BuildSketch(Plane.ZY.offset(35.562657036), mode=Mode.PRIVATE) as cortar_extruir27_sk1:
        with Locations((-42.380961783, -4.875)):
            Circle(CROQUIS47_R)
    cortar_extruir27_tool1 = extrude(cortar_extruir27_sk1.sketch, amount=-CORTAR_EXTRUIR27_REACH, mode=Mode.PRIVATE) & part_1.part
    add(cortar_extruir27_tool1.solids().sort_by_distance((-35.562657, -4.875, -42.380962))[0], mode=Mode.SUBTRACT)

    # Croquis48 → Cortar-Extruir28 (cut, up to next)
    with BuildSketch(Plane.ZY.offset(35.562657036).offset(CORTAR_EXTRUIR28_START), mode=Mode.PRIVATE) as cortar_extruir28_sk1:
        Polygon((-40.778814786, -7.65), (-39.176667789, -4.875), (-40.778814786, -2.1), (-43.98310878, -2.1), (-45.585255777, -4.875), (-43.98310878, -7.65), align=None)
    cortar_extruir28_tool1 = extrude(cortar_extruir28_sk1.sketch, amount=-CORTAR_EXTRUIR28_REACH, mode=Mode.PRIVATE) & part_1.part
    add(cortar_extruir28_tool1.solids().sort_by_distance((-33.562657, -4.875, -42.380962))[0], mode=Mode.SUBTRACT)

    # Croquis49 → Cortar-Extruir29 (cut)
    with BuildSketch(Plane(origin=(0, 0, 0), x_dir=(1, 0, 0), z_dir=(0, 1, 0)).offset(CORTAR_EXTRUIR29_START)):
        Polygon((26.668463565, 32.939848028), (35.018127843, 42.681568496), (35.018127843, 46.511923567), (10.83365133, 46.511923567), align=None)
    extrude(amount=CORTAR_EXTRUIR29_DEPTH, mode=Mode.SUBTRACT)

    # Croquis50 → Cortar-Extruir30 (cut, up to next)
    with BuildSketch(Plane(origin=(0, 0, -50.511923567), x_dir=(-1, 0, 0), z_dir=(0, 0, -1)), mode=Mode.PRIVATE) as cortar_extruir30_sk1:
        with Locations((25.562657036, -6.75)):
            Circle(CROQUIS50_R)
    cortar_extruir30_tool1 = extrude(cortar_extruir30_sk1.sketch, amount=-CORTAR_EXTRUIR30_REACH, mode=Mode.PRIVATE) & part_1.part
    add(cortar_extruir30_tool1.solids().sort_by_distance((-25.562657, -6.75, -50.511924))[0], mode=Mode.SUBTRACT)
    # Croquis50 → Cortar-Extruir30 (cut, up to next)
    with BuildSketch(Plane(origin=(0, 0, -50.511923567), x_dir=(-1, 0, 0), z_dir=(0, 0, -1)), mode=Mode.PRIVATE) as cortar_extruir30_sk2:
        with Locations((-24.437342964, -6.75)):
            Circle(CROQUIS50_R)
    cortar_extruir30_tool2 = extrude(cortar_extruir30_sk2.sketch, amount=-CORTAR_EXTRUIR30_REACH, mode=Mode.PRIVATE) & part_1.part
    add(cortar_extruir30_tool2.solids().sort_by_distance((24.437343, -6.75, -50.511924))[0], mode=Mode.SUBTRACT)

    # Croquis51 → Cortar-Extruir31 (cut, up to next)
    with BuildSketch(Plane(origin=(0, 0, -50.511923567), x_dir=(-1, 0, 0), z_dir=(0, 0, -1)).offset(CORTAR_EXTRUIR31_START), mode=Mode.PRIVATE) as cortar_extruir31_sk1:
        Polygon((-22.835195967, -9.525), (-21.23304897, -6.75), (-22.835195967, -3.975), (-26.039489961, -3.975), (-27.641636958, -6.75), (-26.039489961, -9.525), align=None)
    cortar_extruir31_tool1 = extrude(cortar_extruir31_sk1.sketch, amount=-CORTAR_EXTRUIR31_REACH, mode=Mode.PRIVATE) & part_1.part
    add(cortar_extruir31_tool1.solids().sort_by_distance((24.437343, -6.75, -48.511924))[0], mode=Mode.SUBTRACT)
    # Croquis51 → Cortar-Extruir31 (cut, up to next)
    with BuildSketch(Plane(origin=(0, 0, -50.511923567), x_dir=(-1, 0, 0), z_dir=(0, 0, -1)).offset(CORTAR_EXTRUIR31_START), mode=Mode.PRIVATE) as cortar_extruir31_sk2:
        Polygon((27.164804033, -9.525), (28.76695103, -6.75), (27.164804033, -3.975), (23.960510039, -3.975), (22.358363042, -6.75), (23.960510039, -9.525), align=None)
    cortar_extruir31_tool2 = extrude(cortar_extruir31_sk2.sketch, amount=-CORTAR_EXTRUIR31_REACH, mode=Mode.PRIVATE) & part_1.part
    add(cortar_extruir31_tool2.solids().sort_by_distance((-25.562657, -6.75, -48.511924))[0], mode=Mode.SUBTRACT)

    # Simetría2: part across face


with BuildPart() as part_2:
    add(part_1.part)
    add(part_1.part.mirror(Plane(origin=(19.502677982, -12.75, -25.93599085), x_dir=(0, 0, 1), z_dir=(0, -1, 0))))

    # Croquis19 → Cortar-Extruir13 (cut, two sides)
    with BuildSketch(Plane(origin=(0, 0, -61.623336743), x_dir=(-1, 0, 0), z_dir=(0, 0, -1))) as cortar_extruir13_sk:
        with Locations((-18.558865962, 3.693325654)):
            Rectangle(CROQUIS19_W, CROQUIS19_H)
    extrude(amount=CORTAR_EXTRUIR13_DEPTH, mode=Mode.SUBTRACT)
    extrude(cortar_extruir13_sk.sketch, amount=-CORTAR_EXTRUIR13_DEPTH_BACK, mode=Mode.SUBTRACT)


solid = part_2.part
